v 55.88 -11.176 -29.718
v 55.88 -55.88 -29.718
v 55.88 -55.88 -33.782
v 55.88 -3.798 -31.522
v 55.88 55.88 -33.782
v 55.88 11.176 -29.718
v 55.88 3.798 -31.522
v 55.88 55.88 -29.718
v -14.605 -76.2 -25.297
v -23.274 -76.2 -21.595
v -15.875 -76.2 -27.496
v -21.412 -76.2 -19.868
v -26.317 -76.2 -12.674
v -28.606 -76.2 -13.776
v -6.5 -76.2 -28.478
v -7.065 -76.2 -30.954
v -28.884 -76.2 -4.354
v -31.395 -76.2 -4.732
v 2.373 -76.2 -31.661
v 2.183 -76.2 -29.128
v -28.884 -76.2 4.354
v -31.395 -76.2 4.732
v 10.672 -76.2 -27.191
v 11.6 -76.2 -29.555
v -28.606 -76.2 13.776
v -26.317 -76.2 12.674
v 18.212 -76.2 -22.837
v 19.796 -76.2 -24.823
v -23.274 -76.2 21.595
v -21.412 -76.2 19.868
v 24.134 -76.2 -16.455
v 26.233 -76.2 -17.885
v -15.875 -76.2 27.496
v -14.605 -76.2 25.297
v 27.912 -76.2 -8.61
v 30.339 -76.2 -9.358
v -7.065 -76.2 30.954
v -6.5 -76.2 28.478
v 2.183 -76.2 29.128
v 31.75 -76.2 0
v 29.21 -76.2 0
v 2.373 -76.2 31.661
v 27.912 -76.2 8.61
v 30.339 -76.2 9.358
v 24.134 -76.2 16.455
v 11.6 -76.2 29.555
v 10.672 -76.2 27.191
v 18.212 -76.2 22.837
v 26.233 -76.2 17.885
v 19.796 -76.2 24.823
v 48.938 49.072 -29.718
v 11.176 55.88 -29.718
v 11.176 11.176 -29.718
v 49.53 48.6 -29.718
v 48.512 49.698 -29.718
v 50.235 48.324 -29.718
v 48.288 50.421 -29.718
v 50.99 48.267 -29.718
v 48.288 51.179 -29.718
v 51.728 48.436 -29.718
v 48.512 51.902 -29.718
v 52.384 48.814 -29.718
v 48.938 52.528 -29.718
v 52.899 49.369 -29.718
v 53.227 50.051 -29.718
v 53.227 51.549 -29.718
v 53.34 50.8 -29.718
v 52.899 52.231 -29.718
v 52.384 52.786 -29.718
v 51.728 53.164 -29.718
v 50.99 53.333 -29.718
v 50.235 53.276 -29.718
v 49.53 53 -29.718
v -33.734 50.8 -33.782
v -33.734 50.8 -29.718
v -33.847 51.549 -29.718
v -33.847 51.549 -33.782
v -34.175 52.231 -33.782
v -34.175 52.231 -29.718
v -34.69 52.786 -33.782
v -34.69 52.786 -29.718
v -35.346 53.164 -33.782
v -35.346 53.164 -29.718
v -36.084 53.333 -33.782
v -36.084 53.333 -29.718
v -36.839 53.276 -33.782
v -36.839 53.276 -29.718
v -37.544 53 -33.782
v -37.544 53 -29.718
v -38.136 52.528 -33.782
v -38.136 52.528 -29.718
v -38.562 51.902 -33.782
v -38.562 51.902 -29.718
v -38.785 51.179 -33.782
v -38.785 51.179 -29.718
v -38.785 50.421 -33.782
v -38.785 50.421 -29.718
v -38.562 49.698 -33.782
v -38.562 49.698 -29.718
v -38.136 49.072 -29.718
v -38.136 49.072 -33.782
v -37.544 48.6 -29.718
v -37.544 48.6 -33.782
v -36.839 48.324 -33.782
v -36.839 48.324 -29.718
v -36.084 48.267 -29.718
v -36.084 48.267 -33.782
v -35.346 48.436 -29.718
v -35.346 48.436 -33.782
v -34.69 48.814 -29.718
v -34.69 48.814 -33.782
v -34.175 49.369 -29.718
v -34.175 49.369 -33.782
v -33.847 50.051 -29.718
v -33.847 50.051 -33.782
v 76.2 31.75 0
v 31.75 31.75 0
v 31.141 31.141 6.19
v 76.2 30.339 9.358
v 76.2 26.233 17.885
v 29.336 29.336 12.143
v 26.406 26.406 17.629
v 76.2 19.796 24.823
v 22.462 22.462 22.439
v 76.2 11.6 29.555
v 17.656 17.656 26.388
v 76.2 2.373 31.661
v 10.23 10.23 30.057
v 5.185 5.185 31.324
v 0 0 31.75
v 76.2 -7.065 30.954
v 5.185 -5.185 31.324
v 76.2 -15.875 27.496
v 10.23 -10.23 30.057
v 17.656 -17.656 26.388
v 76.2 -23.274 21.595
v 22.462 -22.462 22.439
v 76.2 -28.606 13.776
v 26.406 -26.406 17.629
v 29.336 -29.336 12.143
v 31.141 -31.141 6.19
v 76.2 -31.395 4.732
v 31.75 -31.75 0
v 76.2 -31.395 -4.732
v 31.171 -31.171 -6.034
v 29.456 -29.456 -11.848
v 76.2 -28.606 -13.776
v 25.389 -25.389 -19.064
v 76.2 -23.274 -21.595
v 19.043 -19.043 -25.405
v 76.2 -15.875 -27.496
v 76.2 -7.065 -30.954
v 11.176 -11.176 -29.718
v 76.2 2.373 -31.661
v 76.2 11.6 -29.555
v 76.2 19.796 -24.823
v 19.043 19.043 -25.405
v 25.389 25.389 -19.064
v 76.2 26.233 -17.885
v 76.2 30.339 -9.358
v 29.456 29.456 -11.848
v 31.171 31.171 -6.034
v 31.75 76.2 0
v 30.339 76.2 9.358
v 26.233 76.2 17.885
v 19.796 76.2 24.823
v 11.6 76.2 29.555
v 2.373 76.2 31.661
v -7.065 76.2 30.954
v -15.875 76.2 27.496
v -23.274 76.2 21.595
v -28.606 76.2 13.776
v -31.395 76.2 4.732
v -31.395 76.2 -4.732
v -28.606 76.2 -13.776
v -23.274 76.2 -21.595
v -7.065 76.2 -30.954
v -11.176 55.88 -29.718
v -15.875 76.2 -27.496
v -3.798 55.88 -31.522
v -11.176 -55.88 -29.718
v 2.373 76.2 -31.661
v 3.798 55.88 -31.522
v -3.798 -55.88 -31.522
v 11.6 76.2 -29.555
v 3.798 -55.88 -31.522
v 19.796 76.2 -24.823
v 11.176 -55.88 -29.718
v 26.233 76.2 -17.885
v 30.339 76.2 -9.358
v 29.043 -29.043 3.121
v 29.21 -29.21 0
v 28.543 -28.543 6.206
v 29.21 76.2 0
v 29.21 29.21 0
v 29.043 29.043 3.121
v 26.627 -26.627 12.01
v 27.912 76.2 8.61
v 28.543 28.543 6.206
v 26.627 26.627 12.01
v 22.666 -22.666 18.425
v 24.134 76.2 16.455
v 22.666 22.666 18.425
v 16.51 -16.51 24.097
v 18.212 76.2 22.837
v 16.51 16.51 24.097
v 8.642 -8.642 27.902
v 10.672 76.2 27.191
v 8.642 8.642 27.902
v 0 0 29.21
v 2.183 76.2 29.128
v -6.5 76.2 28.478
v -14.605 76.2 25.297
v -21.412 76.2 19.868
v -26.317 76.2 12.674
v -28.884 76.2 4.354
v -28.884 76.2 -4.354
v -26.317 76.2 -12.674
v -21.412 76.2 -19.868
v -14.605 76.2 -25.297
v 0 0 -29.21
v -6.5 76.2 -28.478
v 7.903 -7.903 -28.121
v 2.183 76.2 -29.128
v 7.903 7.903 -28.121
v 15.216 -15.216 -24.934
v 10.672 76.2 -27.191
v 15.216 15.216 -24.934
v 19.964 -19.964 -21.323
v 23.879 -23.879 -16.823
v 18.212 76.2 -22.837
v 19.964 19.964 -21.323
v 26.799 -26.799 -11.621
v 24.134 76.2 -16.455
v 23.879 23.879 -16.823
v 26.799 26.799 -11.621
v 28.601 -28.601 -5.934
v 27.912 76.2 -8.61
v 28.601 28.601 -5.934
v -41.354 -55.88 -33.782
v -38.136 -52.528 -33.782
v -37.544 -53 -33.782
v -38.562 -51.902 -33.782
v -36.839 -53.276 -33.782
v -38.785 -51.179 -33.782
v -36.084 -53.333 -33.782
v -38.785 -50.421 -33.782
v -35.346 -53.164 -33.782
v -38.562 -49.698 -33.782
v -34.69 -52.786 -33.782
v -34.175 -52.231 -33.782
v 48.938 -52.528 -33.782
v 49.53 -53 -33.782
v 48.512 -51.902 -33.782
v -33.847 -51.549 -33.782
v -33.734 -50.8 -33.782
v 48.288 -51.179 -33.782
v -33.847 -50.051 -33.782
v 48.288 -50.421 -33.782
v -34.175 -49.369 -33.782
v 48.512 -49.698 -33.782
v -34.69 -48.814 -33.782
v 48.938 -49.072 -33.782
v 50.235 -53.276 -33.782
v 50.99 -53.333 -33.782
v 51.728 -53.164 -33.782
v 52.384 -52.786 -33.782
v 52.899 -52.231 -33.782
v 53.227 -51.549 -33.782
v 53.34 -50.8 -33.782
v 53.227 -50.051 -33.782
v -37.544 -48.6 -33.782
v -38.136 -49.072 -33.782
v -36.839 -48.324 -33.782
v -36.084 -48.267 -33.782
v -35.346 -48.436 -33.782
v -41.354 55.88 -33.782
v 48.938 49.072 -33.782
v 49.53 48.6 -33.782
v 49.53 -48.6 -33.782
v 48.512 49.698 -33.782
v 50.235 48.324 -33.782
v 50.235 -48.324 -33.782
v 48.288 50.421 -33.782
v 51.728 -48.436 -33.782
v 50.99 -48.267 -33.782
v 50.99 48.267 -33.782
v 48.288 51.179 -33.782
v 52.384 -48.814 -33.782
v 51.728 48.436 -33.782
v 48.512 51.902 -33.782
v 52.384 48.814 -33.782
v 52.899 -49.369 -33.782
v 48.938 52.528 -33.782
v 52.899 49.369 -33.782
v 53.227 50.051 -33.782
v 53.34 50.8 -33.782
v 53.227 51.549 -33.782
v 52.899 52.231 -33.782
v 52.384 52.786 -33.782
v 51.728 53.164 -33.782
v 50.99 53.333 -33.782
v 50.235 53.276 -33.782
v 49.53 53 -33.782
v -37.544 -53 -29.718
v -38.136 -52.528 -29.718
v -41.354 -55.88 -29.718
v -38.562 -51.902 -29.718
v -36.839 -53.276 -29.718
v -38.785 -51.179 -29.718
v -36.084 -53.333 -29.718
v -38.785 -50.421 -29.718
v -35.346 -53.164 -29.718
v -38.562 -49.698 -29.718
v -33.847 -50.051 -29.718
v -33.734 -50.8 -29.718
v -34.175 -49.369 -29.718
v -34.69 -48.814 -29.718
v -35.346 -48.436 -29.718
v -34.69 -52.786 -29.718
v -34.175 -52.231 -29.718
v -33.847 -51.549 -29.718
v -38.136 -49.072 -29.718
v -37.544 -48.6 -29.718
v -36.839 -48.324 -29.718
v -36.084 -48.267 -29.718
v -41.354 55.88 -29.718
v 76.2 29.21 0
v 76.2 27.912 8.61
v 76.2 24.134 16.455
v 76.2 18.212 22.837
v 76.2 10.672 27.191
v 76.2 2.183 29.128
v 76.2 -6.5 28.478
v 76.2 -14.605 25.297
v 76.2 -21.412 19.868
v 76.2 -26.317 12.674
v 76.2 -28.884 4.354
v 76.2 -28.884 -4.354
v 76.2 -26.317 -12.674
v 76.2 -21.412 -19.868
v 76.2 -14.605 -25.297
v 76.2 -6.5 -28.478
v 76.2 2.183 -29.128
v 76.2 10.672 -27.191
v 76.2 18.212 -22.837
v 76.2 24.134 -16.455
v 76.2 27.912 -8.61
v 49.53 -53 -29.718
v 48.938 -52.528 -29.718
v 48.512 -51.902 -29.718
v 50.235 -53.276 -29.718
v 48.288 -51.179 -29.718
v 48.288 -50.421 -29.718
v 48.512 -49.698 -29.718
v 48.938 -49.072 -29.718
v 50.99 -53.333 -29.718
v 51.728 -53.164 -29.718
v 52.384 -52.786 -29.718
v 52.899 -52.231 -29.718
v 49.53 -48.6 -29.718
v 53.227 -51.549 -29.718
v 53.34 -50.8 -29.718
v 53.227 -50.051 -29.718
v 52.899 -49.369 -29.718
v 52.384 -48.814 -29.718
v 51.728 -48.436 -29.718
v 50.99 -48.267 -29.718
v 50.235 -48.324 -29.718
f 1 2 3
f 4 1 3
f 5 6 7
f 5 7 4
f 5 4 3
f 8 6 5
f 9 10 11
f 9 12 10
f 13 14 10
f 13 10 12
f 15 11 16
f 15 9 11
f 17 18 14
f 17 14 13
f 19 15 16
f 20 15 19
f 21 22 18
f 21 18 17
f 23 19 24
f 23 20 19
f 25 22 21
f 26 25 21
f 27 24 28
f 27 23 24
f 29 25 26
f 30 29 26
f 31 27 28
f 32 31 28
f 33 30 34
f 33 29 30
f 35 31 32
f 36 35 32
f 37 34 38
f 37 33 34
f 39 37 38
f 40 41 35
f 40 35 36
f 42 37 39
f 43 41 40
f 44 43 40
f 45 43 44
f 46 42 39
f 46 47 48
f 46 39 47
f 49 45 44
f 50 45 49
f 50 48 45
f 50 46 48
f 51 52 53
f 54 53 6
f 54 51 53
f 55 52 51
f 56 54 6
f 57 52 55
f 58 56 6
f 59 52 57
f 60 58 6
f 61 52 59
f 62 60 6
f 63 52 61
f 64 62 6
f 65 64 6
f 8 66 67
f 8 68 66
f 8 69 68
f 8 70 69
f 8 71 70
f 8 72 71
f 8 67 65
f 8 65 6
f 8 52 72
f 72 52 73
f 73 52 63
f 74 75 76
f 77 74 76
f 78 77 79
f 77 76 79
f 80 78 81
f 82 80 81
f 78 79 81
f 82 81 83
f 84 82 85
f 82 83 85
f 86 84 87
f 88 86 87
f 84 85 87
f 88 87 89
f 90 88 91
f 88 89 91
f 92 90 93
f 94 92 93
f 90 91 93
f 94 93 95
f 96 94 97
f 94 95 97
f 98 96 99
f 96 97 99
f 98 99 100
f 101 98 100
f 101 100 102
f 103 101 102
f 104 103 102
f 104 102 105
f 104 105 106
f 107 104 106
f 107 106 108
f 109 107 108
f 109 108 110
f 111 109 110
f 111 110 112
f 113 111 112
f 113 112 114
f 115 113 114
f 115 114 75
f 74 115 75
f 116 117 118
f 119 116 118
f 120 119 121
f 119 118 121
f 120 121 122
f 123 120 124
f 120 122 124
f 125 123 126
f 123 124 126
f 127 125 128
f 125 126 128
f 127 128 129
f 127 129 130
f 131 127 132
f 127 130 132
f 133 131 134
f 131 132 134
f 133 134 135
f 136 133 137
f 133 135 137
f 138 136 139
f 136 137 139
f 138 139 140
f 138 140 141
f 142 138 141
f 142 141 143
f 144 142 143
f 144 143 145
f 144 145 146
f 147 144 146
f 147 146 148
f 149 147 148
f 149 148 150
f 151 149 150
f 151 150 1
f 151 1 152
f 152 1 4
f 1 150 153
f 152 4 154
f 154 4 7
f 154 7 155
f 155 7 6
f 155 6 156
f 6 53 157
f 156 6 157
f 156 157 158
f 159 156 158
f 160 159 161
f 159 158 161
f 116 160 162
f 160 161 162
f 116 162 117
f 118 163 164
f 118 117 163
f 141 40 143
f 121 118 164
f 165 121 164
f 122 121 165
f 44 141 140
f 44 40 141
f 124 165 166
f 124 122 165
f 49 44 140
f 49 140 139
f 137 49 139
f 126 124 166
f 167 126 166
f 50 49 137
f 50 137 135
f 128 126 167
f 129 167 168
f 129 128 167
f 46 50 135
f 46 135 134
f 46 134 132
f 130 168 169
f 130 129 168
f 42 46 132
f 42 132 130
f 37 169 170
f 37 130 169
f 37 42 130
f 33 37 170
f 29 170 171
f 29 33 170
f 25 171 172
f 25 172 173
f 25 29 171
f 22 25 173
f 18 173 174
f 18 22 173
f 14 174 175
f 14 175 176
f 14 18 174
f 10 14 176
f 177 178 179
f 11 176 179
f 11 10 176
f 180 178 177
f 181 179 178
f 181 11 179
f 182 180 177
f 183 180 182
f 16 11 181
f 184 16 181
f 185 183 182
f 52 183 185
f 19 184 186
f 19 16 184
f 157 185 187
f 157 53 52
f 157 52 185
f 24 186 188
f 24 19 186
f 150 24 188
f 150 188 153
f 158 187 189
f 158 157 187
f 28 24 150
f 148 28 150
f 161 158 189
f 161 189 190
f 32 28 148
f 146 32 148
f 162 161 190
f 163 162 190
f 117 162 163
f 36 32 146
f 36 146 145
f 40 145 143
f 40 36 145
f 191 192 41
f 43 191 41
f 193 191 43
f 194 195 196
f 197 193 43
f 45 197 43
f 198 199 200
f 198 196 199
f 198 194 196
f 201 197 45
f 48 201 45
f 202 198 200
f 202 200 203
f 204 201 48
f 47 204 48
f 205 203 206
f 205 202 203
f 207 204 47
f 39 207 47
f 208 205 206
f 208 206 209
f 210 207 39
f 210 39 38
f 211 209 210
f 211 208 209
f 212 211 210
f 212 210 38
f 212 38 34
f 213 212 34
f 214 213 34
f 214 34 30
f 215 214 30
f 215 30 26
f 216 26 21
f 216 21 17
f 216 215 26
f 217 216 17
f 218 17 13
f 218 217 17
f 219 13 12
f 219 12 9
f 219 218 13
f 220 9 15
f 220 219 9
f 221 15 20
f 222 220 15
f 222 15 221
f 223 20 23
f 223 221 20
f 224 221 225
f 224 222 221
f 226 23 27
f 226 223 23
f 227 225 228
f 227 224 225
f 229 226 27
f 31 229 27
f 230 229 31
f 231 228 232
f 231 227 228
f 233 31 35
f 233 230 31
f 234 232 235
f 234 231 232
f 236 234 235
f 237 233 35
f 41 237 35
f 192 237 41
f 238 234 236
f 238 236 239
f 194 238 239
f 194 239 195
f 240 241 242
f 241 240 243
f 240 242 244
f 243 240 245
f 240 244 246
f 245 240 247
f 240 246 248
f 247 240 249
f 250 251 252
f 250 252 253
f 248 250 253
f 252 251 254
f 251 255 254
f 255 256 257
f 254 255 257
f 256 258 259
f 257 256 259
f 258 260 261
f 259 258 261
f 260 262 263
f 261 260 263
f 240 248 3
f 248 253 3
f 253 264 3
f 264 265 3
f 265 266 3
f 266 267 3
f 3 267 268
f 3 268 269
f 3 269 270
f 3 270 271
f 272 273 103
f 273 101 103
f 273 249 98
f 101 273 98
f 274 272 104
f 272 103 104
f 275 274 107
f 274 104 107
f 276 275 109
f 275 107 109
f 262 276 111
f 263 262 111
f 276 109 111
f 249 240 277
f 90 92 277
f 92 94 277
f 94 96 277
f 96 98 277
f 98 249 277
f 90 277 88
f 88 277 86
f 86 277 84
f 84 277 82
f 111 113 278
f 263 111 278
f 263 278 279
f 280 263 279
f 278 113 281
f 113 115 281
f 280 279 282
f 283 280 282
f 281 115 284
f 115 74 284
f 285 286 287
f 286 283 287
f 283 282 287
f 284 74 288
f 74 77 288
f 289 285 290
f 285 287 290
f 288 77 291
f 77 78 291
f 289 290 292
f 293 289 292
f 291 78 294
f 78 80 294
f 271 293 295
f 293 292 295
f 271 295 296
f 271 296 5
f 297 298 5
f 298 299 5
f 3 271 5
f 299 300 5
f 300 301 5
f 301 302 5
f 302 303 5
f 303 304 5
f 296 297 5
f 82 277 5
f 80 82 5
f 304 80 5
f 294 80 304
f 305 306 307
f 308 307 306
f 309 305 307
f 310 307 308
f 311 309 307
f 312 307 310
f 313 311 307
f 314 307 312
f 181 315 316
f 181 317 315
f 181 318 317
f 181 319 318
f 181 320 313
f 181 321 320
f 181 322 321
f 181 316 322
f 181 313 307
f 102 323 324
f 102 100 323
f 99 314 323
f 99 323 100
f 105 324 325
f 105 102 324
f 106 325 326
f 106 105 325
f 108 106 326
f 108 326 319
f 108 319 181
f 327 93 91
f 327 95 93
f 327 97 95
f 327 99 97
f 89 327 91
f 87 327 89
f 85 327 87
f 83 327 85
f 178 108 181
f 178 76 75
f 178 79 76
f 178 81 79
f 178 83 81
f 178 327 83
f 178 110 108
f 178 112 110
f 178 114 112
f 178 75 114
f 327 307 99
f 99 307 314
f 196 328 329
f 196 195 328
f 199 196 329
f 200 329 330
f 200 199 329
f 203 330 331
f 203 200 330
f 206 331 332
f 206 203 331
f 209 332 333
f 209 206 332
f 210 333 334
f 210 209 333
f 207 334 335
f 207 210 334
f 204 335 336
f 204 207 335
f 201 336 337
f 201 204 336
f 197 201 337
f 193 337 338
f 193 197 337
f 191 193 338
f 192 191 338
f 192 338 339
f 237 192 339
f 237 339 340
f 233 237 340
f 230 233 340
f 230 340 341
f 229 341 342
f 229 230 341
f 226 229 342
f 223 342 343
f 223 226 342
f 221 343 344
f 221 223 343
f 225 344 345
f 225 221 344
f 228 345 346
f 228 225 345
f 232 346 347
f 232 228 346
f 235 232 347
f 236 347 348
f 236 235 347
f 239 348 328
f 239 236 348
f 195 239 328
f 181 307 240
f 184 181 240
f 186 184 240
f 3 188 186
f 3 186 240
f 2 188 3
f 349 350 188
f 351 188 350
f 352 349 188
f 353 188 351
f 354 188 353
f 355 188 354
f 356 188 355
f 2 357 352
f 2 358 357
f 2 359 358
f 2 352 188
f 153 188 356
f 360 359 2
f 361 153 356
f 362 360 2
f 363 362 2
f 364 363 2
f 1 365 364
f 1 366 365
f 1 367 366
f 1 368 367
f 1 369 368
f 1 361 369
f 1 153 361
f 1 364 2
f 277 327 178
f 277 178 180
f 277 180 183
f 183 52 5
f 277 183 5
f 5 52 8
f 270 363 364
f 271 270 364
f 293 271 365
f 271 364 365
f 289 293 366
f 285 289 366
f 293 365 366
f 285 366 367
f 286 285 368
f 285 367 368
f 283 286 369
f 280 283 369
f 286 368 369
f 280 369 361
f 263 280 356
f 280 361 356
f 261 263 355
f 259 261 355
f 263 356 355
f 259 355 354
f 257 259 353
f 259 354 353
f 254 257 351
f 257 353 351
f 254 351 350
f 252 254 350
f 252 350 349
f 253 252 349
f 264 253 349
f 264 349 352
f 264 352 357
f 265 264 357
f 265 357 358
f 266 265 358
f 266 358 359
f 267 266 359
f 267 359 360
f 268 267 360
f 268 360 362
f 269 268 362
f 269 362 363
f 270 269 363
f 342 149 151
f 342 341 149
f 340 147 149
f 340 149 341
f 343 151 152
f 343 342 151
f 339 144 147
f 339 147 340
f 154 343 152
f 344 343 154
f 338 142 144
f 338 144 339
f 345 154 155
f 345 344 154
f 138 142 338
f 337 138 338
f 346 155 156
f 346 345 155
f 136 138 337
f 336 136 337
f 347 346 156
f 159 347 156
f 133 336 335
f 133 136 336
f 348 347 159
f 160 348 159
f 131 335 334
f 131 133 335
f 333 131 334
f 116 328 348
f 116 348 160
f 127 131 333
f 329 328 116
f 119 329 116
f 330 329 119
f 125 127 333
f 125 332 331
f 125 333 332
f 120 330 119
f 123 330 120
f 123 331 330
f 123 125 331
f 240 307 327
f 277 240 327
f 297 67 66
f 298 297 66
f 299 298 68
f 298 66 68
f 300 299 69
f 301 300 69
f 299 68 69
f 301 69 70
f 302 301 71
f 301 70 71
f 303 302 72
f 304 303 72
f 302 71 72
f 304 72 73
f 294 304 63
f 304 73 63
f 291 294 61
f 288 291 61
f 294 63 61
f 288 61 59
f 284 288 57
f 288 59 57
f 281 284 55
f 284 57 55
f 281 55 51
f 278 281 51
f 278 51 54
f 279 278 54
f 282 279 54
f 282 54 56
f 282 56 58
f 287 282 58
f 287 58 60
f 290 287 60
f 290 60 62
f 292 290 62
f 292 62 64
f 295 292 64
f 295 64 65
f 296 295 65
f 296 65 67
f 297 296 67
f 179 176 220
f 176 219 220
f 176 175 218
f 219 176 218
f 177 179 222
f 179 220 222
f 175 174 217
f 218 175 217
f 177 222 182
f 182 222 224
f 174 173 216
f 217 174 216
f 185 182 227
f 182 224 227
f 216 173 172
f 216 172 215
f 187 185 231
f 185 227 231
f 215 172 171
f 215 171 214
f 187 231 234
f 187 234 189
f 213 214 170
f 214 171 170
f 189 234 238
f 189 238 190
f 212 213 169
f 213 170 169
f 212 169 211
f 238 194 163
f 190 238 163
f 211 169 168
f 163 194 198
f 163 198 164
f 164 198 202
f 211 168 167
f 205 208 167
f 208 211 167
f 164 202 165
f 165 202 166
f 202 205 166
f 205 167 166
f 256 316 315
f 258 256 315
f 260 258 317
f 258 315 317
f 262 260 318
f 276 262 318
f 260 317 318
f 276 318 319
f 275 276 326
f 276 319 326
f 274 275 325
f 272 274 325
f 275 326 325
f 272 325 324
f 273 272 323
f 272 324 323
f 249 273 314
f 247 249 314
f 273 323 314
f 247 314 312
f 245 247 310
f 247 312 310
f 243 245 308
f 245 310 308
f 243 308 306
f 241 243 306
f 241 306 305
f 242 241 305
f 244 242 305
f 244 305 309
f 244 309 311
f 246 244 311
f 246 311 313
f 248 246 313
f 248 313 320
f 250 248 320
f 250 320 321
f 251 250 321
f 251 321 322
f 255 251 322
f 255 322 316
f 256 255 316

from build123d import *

# Parameters (mm, degrees)
F0_R      = 31.75
F0_R_2    = 29.21
F1_DEPTH  = 76.2
F2_R      = 31.75
F2_R_2    = 29.21
F3_DEPTH  = 76.2
F4_DEPTH  = 52.832
F5_DEPTH  = 44.45
F7_W      = 97.233793
F7_H      = 111.76
F8_DEPTH  = 2.032
F9_R      = 2.54
F10_DEPTH = 25.4


with BuildPart() as f1:
    # F0 (on Front) → F1 (new body, symmetric)
    with BuildSketch(Plane.XZ):
        Circle(F0_R)
        Circle(F0_R_2, mode=Mode.SUBTRACT)
    extrude(amount=F1_DEPTH, both=True)

    # F2 (on Right) → F3 (join)
    with BuildSketch(Plane.YZ):
        Circle(F2_R)
        Circle(F2_R_2, mode=Mode.SUBTRACT)
    extrude(amount=F3_DEPTH)

    # F0 (on Front) → F4 (cut, symmetric)
    with BuildSketch(Plane.XZ):
        Circle(F0_R_2)
    extrude(amount=F4_DEPTH, both=True, mode=Mode.SUBTRACT)

    # F2 (on Right) → F5 (cut)
    with BuildSketch(Plane.YZ):
        Circle(F2_R_2)
    extrude(amount=F5_DEPTH, mode=Mode.SUBTRACT)

    # F7 (on offset) → F8 (join, symmetric)
    with BuildSketch(Plane.XY.offset(-31.75)):
        with Locations((7.263103, 0)):
            Rectangle(F7_W, F7_H)
    extrude(amount=F8_DEPTH, both=True)

    # F9 (on face) → F10 (cut)
    with BuildSketch(Plane.XY.offset(-29.718)):
        with Locations((-36.273793, 50.8)):
            Circle(F9_R)
        with Locations((50.8, 50.8)):
            Circle(F9_R)
        with Locations((50.8, -50.8)):
            Circle(F9_R)
        with Locations((-36.273793, -50.8)):
            Circle(F9_R)
    extrude(amount=-F10_DEPTH, mode=Mode.SUBTRACT)


solid = f1.part
